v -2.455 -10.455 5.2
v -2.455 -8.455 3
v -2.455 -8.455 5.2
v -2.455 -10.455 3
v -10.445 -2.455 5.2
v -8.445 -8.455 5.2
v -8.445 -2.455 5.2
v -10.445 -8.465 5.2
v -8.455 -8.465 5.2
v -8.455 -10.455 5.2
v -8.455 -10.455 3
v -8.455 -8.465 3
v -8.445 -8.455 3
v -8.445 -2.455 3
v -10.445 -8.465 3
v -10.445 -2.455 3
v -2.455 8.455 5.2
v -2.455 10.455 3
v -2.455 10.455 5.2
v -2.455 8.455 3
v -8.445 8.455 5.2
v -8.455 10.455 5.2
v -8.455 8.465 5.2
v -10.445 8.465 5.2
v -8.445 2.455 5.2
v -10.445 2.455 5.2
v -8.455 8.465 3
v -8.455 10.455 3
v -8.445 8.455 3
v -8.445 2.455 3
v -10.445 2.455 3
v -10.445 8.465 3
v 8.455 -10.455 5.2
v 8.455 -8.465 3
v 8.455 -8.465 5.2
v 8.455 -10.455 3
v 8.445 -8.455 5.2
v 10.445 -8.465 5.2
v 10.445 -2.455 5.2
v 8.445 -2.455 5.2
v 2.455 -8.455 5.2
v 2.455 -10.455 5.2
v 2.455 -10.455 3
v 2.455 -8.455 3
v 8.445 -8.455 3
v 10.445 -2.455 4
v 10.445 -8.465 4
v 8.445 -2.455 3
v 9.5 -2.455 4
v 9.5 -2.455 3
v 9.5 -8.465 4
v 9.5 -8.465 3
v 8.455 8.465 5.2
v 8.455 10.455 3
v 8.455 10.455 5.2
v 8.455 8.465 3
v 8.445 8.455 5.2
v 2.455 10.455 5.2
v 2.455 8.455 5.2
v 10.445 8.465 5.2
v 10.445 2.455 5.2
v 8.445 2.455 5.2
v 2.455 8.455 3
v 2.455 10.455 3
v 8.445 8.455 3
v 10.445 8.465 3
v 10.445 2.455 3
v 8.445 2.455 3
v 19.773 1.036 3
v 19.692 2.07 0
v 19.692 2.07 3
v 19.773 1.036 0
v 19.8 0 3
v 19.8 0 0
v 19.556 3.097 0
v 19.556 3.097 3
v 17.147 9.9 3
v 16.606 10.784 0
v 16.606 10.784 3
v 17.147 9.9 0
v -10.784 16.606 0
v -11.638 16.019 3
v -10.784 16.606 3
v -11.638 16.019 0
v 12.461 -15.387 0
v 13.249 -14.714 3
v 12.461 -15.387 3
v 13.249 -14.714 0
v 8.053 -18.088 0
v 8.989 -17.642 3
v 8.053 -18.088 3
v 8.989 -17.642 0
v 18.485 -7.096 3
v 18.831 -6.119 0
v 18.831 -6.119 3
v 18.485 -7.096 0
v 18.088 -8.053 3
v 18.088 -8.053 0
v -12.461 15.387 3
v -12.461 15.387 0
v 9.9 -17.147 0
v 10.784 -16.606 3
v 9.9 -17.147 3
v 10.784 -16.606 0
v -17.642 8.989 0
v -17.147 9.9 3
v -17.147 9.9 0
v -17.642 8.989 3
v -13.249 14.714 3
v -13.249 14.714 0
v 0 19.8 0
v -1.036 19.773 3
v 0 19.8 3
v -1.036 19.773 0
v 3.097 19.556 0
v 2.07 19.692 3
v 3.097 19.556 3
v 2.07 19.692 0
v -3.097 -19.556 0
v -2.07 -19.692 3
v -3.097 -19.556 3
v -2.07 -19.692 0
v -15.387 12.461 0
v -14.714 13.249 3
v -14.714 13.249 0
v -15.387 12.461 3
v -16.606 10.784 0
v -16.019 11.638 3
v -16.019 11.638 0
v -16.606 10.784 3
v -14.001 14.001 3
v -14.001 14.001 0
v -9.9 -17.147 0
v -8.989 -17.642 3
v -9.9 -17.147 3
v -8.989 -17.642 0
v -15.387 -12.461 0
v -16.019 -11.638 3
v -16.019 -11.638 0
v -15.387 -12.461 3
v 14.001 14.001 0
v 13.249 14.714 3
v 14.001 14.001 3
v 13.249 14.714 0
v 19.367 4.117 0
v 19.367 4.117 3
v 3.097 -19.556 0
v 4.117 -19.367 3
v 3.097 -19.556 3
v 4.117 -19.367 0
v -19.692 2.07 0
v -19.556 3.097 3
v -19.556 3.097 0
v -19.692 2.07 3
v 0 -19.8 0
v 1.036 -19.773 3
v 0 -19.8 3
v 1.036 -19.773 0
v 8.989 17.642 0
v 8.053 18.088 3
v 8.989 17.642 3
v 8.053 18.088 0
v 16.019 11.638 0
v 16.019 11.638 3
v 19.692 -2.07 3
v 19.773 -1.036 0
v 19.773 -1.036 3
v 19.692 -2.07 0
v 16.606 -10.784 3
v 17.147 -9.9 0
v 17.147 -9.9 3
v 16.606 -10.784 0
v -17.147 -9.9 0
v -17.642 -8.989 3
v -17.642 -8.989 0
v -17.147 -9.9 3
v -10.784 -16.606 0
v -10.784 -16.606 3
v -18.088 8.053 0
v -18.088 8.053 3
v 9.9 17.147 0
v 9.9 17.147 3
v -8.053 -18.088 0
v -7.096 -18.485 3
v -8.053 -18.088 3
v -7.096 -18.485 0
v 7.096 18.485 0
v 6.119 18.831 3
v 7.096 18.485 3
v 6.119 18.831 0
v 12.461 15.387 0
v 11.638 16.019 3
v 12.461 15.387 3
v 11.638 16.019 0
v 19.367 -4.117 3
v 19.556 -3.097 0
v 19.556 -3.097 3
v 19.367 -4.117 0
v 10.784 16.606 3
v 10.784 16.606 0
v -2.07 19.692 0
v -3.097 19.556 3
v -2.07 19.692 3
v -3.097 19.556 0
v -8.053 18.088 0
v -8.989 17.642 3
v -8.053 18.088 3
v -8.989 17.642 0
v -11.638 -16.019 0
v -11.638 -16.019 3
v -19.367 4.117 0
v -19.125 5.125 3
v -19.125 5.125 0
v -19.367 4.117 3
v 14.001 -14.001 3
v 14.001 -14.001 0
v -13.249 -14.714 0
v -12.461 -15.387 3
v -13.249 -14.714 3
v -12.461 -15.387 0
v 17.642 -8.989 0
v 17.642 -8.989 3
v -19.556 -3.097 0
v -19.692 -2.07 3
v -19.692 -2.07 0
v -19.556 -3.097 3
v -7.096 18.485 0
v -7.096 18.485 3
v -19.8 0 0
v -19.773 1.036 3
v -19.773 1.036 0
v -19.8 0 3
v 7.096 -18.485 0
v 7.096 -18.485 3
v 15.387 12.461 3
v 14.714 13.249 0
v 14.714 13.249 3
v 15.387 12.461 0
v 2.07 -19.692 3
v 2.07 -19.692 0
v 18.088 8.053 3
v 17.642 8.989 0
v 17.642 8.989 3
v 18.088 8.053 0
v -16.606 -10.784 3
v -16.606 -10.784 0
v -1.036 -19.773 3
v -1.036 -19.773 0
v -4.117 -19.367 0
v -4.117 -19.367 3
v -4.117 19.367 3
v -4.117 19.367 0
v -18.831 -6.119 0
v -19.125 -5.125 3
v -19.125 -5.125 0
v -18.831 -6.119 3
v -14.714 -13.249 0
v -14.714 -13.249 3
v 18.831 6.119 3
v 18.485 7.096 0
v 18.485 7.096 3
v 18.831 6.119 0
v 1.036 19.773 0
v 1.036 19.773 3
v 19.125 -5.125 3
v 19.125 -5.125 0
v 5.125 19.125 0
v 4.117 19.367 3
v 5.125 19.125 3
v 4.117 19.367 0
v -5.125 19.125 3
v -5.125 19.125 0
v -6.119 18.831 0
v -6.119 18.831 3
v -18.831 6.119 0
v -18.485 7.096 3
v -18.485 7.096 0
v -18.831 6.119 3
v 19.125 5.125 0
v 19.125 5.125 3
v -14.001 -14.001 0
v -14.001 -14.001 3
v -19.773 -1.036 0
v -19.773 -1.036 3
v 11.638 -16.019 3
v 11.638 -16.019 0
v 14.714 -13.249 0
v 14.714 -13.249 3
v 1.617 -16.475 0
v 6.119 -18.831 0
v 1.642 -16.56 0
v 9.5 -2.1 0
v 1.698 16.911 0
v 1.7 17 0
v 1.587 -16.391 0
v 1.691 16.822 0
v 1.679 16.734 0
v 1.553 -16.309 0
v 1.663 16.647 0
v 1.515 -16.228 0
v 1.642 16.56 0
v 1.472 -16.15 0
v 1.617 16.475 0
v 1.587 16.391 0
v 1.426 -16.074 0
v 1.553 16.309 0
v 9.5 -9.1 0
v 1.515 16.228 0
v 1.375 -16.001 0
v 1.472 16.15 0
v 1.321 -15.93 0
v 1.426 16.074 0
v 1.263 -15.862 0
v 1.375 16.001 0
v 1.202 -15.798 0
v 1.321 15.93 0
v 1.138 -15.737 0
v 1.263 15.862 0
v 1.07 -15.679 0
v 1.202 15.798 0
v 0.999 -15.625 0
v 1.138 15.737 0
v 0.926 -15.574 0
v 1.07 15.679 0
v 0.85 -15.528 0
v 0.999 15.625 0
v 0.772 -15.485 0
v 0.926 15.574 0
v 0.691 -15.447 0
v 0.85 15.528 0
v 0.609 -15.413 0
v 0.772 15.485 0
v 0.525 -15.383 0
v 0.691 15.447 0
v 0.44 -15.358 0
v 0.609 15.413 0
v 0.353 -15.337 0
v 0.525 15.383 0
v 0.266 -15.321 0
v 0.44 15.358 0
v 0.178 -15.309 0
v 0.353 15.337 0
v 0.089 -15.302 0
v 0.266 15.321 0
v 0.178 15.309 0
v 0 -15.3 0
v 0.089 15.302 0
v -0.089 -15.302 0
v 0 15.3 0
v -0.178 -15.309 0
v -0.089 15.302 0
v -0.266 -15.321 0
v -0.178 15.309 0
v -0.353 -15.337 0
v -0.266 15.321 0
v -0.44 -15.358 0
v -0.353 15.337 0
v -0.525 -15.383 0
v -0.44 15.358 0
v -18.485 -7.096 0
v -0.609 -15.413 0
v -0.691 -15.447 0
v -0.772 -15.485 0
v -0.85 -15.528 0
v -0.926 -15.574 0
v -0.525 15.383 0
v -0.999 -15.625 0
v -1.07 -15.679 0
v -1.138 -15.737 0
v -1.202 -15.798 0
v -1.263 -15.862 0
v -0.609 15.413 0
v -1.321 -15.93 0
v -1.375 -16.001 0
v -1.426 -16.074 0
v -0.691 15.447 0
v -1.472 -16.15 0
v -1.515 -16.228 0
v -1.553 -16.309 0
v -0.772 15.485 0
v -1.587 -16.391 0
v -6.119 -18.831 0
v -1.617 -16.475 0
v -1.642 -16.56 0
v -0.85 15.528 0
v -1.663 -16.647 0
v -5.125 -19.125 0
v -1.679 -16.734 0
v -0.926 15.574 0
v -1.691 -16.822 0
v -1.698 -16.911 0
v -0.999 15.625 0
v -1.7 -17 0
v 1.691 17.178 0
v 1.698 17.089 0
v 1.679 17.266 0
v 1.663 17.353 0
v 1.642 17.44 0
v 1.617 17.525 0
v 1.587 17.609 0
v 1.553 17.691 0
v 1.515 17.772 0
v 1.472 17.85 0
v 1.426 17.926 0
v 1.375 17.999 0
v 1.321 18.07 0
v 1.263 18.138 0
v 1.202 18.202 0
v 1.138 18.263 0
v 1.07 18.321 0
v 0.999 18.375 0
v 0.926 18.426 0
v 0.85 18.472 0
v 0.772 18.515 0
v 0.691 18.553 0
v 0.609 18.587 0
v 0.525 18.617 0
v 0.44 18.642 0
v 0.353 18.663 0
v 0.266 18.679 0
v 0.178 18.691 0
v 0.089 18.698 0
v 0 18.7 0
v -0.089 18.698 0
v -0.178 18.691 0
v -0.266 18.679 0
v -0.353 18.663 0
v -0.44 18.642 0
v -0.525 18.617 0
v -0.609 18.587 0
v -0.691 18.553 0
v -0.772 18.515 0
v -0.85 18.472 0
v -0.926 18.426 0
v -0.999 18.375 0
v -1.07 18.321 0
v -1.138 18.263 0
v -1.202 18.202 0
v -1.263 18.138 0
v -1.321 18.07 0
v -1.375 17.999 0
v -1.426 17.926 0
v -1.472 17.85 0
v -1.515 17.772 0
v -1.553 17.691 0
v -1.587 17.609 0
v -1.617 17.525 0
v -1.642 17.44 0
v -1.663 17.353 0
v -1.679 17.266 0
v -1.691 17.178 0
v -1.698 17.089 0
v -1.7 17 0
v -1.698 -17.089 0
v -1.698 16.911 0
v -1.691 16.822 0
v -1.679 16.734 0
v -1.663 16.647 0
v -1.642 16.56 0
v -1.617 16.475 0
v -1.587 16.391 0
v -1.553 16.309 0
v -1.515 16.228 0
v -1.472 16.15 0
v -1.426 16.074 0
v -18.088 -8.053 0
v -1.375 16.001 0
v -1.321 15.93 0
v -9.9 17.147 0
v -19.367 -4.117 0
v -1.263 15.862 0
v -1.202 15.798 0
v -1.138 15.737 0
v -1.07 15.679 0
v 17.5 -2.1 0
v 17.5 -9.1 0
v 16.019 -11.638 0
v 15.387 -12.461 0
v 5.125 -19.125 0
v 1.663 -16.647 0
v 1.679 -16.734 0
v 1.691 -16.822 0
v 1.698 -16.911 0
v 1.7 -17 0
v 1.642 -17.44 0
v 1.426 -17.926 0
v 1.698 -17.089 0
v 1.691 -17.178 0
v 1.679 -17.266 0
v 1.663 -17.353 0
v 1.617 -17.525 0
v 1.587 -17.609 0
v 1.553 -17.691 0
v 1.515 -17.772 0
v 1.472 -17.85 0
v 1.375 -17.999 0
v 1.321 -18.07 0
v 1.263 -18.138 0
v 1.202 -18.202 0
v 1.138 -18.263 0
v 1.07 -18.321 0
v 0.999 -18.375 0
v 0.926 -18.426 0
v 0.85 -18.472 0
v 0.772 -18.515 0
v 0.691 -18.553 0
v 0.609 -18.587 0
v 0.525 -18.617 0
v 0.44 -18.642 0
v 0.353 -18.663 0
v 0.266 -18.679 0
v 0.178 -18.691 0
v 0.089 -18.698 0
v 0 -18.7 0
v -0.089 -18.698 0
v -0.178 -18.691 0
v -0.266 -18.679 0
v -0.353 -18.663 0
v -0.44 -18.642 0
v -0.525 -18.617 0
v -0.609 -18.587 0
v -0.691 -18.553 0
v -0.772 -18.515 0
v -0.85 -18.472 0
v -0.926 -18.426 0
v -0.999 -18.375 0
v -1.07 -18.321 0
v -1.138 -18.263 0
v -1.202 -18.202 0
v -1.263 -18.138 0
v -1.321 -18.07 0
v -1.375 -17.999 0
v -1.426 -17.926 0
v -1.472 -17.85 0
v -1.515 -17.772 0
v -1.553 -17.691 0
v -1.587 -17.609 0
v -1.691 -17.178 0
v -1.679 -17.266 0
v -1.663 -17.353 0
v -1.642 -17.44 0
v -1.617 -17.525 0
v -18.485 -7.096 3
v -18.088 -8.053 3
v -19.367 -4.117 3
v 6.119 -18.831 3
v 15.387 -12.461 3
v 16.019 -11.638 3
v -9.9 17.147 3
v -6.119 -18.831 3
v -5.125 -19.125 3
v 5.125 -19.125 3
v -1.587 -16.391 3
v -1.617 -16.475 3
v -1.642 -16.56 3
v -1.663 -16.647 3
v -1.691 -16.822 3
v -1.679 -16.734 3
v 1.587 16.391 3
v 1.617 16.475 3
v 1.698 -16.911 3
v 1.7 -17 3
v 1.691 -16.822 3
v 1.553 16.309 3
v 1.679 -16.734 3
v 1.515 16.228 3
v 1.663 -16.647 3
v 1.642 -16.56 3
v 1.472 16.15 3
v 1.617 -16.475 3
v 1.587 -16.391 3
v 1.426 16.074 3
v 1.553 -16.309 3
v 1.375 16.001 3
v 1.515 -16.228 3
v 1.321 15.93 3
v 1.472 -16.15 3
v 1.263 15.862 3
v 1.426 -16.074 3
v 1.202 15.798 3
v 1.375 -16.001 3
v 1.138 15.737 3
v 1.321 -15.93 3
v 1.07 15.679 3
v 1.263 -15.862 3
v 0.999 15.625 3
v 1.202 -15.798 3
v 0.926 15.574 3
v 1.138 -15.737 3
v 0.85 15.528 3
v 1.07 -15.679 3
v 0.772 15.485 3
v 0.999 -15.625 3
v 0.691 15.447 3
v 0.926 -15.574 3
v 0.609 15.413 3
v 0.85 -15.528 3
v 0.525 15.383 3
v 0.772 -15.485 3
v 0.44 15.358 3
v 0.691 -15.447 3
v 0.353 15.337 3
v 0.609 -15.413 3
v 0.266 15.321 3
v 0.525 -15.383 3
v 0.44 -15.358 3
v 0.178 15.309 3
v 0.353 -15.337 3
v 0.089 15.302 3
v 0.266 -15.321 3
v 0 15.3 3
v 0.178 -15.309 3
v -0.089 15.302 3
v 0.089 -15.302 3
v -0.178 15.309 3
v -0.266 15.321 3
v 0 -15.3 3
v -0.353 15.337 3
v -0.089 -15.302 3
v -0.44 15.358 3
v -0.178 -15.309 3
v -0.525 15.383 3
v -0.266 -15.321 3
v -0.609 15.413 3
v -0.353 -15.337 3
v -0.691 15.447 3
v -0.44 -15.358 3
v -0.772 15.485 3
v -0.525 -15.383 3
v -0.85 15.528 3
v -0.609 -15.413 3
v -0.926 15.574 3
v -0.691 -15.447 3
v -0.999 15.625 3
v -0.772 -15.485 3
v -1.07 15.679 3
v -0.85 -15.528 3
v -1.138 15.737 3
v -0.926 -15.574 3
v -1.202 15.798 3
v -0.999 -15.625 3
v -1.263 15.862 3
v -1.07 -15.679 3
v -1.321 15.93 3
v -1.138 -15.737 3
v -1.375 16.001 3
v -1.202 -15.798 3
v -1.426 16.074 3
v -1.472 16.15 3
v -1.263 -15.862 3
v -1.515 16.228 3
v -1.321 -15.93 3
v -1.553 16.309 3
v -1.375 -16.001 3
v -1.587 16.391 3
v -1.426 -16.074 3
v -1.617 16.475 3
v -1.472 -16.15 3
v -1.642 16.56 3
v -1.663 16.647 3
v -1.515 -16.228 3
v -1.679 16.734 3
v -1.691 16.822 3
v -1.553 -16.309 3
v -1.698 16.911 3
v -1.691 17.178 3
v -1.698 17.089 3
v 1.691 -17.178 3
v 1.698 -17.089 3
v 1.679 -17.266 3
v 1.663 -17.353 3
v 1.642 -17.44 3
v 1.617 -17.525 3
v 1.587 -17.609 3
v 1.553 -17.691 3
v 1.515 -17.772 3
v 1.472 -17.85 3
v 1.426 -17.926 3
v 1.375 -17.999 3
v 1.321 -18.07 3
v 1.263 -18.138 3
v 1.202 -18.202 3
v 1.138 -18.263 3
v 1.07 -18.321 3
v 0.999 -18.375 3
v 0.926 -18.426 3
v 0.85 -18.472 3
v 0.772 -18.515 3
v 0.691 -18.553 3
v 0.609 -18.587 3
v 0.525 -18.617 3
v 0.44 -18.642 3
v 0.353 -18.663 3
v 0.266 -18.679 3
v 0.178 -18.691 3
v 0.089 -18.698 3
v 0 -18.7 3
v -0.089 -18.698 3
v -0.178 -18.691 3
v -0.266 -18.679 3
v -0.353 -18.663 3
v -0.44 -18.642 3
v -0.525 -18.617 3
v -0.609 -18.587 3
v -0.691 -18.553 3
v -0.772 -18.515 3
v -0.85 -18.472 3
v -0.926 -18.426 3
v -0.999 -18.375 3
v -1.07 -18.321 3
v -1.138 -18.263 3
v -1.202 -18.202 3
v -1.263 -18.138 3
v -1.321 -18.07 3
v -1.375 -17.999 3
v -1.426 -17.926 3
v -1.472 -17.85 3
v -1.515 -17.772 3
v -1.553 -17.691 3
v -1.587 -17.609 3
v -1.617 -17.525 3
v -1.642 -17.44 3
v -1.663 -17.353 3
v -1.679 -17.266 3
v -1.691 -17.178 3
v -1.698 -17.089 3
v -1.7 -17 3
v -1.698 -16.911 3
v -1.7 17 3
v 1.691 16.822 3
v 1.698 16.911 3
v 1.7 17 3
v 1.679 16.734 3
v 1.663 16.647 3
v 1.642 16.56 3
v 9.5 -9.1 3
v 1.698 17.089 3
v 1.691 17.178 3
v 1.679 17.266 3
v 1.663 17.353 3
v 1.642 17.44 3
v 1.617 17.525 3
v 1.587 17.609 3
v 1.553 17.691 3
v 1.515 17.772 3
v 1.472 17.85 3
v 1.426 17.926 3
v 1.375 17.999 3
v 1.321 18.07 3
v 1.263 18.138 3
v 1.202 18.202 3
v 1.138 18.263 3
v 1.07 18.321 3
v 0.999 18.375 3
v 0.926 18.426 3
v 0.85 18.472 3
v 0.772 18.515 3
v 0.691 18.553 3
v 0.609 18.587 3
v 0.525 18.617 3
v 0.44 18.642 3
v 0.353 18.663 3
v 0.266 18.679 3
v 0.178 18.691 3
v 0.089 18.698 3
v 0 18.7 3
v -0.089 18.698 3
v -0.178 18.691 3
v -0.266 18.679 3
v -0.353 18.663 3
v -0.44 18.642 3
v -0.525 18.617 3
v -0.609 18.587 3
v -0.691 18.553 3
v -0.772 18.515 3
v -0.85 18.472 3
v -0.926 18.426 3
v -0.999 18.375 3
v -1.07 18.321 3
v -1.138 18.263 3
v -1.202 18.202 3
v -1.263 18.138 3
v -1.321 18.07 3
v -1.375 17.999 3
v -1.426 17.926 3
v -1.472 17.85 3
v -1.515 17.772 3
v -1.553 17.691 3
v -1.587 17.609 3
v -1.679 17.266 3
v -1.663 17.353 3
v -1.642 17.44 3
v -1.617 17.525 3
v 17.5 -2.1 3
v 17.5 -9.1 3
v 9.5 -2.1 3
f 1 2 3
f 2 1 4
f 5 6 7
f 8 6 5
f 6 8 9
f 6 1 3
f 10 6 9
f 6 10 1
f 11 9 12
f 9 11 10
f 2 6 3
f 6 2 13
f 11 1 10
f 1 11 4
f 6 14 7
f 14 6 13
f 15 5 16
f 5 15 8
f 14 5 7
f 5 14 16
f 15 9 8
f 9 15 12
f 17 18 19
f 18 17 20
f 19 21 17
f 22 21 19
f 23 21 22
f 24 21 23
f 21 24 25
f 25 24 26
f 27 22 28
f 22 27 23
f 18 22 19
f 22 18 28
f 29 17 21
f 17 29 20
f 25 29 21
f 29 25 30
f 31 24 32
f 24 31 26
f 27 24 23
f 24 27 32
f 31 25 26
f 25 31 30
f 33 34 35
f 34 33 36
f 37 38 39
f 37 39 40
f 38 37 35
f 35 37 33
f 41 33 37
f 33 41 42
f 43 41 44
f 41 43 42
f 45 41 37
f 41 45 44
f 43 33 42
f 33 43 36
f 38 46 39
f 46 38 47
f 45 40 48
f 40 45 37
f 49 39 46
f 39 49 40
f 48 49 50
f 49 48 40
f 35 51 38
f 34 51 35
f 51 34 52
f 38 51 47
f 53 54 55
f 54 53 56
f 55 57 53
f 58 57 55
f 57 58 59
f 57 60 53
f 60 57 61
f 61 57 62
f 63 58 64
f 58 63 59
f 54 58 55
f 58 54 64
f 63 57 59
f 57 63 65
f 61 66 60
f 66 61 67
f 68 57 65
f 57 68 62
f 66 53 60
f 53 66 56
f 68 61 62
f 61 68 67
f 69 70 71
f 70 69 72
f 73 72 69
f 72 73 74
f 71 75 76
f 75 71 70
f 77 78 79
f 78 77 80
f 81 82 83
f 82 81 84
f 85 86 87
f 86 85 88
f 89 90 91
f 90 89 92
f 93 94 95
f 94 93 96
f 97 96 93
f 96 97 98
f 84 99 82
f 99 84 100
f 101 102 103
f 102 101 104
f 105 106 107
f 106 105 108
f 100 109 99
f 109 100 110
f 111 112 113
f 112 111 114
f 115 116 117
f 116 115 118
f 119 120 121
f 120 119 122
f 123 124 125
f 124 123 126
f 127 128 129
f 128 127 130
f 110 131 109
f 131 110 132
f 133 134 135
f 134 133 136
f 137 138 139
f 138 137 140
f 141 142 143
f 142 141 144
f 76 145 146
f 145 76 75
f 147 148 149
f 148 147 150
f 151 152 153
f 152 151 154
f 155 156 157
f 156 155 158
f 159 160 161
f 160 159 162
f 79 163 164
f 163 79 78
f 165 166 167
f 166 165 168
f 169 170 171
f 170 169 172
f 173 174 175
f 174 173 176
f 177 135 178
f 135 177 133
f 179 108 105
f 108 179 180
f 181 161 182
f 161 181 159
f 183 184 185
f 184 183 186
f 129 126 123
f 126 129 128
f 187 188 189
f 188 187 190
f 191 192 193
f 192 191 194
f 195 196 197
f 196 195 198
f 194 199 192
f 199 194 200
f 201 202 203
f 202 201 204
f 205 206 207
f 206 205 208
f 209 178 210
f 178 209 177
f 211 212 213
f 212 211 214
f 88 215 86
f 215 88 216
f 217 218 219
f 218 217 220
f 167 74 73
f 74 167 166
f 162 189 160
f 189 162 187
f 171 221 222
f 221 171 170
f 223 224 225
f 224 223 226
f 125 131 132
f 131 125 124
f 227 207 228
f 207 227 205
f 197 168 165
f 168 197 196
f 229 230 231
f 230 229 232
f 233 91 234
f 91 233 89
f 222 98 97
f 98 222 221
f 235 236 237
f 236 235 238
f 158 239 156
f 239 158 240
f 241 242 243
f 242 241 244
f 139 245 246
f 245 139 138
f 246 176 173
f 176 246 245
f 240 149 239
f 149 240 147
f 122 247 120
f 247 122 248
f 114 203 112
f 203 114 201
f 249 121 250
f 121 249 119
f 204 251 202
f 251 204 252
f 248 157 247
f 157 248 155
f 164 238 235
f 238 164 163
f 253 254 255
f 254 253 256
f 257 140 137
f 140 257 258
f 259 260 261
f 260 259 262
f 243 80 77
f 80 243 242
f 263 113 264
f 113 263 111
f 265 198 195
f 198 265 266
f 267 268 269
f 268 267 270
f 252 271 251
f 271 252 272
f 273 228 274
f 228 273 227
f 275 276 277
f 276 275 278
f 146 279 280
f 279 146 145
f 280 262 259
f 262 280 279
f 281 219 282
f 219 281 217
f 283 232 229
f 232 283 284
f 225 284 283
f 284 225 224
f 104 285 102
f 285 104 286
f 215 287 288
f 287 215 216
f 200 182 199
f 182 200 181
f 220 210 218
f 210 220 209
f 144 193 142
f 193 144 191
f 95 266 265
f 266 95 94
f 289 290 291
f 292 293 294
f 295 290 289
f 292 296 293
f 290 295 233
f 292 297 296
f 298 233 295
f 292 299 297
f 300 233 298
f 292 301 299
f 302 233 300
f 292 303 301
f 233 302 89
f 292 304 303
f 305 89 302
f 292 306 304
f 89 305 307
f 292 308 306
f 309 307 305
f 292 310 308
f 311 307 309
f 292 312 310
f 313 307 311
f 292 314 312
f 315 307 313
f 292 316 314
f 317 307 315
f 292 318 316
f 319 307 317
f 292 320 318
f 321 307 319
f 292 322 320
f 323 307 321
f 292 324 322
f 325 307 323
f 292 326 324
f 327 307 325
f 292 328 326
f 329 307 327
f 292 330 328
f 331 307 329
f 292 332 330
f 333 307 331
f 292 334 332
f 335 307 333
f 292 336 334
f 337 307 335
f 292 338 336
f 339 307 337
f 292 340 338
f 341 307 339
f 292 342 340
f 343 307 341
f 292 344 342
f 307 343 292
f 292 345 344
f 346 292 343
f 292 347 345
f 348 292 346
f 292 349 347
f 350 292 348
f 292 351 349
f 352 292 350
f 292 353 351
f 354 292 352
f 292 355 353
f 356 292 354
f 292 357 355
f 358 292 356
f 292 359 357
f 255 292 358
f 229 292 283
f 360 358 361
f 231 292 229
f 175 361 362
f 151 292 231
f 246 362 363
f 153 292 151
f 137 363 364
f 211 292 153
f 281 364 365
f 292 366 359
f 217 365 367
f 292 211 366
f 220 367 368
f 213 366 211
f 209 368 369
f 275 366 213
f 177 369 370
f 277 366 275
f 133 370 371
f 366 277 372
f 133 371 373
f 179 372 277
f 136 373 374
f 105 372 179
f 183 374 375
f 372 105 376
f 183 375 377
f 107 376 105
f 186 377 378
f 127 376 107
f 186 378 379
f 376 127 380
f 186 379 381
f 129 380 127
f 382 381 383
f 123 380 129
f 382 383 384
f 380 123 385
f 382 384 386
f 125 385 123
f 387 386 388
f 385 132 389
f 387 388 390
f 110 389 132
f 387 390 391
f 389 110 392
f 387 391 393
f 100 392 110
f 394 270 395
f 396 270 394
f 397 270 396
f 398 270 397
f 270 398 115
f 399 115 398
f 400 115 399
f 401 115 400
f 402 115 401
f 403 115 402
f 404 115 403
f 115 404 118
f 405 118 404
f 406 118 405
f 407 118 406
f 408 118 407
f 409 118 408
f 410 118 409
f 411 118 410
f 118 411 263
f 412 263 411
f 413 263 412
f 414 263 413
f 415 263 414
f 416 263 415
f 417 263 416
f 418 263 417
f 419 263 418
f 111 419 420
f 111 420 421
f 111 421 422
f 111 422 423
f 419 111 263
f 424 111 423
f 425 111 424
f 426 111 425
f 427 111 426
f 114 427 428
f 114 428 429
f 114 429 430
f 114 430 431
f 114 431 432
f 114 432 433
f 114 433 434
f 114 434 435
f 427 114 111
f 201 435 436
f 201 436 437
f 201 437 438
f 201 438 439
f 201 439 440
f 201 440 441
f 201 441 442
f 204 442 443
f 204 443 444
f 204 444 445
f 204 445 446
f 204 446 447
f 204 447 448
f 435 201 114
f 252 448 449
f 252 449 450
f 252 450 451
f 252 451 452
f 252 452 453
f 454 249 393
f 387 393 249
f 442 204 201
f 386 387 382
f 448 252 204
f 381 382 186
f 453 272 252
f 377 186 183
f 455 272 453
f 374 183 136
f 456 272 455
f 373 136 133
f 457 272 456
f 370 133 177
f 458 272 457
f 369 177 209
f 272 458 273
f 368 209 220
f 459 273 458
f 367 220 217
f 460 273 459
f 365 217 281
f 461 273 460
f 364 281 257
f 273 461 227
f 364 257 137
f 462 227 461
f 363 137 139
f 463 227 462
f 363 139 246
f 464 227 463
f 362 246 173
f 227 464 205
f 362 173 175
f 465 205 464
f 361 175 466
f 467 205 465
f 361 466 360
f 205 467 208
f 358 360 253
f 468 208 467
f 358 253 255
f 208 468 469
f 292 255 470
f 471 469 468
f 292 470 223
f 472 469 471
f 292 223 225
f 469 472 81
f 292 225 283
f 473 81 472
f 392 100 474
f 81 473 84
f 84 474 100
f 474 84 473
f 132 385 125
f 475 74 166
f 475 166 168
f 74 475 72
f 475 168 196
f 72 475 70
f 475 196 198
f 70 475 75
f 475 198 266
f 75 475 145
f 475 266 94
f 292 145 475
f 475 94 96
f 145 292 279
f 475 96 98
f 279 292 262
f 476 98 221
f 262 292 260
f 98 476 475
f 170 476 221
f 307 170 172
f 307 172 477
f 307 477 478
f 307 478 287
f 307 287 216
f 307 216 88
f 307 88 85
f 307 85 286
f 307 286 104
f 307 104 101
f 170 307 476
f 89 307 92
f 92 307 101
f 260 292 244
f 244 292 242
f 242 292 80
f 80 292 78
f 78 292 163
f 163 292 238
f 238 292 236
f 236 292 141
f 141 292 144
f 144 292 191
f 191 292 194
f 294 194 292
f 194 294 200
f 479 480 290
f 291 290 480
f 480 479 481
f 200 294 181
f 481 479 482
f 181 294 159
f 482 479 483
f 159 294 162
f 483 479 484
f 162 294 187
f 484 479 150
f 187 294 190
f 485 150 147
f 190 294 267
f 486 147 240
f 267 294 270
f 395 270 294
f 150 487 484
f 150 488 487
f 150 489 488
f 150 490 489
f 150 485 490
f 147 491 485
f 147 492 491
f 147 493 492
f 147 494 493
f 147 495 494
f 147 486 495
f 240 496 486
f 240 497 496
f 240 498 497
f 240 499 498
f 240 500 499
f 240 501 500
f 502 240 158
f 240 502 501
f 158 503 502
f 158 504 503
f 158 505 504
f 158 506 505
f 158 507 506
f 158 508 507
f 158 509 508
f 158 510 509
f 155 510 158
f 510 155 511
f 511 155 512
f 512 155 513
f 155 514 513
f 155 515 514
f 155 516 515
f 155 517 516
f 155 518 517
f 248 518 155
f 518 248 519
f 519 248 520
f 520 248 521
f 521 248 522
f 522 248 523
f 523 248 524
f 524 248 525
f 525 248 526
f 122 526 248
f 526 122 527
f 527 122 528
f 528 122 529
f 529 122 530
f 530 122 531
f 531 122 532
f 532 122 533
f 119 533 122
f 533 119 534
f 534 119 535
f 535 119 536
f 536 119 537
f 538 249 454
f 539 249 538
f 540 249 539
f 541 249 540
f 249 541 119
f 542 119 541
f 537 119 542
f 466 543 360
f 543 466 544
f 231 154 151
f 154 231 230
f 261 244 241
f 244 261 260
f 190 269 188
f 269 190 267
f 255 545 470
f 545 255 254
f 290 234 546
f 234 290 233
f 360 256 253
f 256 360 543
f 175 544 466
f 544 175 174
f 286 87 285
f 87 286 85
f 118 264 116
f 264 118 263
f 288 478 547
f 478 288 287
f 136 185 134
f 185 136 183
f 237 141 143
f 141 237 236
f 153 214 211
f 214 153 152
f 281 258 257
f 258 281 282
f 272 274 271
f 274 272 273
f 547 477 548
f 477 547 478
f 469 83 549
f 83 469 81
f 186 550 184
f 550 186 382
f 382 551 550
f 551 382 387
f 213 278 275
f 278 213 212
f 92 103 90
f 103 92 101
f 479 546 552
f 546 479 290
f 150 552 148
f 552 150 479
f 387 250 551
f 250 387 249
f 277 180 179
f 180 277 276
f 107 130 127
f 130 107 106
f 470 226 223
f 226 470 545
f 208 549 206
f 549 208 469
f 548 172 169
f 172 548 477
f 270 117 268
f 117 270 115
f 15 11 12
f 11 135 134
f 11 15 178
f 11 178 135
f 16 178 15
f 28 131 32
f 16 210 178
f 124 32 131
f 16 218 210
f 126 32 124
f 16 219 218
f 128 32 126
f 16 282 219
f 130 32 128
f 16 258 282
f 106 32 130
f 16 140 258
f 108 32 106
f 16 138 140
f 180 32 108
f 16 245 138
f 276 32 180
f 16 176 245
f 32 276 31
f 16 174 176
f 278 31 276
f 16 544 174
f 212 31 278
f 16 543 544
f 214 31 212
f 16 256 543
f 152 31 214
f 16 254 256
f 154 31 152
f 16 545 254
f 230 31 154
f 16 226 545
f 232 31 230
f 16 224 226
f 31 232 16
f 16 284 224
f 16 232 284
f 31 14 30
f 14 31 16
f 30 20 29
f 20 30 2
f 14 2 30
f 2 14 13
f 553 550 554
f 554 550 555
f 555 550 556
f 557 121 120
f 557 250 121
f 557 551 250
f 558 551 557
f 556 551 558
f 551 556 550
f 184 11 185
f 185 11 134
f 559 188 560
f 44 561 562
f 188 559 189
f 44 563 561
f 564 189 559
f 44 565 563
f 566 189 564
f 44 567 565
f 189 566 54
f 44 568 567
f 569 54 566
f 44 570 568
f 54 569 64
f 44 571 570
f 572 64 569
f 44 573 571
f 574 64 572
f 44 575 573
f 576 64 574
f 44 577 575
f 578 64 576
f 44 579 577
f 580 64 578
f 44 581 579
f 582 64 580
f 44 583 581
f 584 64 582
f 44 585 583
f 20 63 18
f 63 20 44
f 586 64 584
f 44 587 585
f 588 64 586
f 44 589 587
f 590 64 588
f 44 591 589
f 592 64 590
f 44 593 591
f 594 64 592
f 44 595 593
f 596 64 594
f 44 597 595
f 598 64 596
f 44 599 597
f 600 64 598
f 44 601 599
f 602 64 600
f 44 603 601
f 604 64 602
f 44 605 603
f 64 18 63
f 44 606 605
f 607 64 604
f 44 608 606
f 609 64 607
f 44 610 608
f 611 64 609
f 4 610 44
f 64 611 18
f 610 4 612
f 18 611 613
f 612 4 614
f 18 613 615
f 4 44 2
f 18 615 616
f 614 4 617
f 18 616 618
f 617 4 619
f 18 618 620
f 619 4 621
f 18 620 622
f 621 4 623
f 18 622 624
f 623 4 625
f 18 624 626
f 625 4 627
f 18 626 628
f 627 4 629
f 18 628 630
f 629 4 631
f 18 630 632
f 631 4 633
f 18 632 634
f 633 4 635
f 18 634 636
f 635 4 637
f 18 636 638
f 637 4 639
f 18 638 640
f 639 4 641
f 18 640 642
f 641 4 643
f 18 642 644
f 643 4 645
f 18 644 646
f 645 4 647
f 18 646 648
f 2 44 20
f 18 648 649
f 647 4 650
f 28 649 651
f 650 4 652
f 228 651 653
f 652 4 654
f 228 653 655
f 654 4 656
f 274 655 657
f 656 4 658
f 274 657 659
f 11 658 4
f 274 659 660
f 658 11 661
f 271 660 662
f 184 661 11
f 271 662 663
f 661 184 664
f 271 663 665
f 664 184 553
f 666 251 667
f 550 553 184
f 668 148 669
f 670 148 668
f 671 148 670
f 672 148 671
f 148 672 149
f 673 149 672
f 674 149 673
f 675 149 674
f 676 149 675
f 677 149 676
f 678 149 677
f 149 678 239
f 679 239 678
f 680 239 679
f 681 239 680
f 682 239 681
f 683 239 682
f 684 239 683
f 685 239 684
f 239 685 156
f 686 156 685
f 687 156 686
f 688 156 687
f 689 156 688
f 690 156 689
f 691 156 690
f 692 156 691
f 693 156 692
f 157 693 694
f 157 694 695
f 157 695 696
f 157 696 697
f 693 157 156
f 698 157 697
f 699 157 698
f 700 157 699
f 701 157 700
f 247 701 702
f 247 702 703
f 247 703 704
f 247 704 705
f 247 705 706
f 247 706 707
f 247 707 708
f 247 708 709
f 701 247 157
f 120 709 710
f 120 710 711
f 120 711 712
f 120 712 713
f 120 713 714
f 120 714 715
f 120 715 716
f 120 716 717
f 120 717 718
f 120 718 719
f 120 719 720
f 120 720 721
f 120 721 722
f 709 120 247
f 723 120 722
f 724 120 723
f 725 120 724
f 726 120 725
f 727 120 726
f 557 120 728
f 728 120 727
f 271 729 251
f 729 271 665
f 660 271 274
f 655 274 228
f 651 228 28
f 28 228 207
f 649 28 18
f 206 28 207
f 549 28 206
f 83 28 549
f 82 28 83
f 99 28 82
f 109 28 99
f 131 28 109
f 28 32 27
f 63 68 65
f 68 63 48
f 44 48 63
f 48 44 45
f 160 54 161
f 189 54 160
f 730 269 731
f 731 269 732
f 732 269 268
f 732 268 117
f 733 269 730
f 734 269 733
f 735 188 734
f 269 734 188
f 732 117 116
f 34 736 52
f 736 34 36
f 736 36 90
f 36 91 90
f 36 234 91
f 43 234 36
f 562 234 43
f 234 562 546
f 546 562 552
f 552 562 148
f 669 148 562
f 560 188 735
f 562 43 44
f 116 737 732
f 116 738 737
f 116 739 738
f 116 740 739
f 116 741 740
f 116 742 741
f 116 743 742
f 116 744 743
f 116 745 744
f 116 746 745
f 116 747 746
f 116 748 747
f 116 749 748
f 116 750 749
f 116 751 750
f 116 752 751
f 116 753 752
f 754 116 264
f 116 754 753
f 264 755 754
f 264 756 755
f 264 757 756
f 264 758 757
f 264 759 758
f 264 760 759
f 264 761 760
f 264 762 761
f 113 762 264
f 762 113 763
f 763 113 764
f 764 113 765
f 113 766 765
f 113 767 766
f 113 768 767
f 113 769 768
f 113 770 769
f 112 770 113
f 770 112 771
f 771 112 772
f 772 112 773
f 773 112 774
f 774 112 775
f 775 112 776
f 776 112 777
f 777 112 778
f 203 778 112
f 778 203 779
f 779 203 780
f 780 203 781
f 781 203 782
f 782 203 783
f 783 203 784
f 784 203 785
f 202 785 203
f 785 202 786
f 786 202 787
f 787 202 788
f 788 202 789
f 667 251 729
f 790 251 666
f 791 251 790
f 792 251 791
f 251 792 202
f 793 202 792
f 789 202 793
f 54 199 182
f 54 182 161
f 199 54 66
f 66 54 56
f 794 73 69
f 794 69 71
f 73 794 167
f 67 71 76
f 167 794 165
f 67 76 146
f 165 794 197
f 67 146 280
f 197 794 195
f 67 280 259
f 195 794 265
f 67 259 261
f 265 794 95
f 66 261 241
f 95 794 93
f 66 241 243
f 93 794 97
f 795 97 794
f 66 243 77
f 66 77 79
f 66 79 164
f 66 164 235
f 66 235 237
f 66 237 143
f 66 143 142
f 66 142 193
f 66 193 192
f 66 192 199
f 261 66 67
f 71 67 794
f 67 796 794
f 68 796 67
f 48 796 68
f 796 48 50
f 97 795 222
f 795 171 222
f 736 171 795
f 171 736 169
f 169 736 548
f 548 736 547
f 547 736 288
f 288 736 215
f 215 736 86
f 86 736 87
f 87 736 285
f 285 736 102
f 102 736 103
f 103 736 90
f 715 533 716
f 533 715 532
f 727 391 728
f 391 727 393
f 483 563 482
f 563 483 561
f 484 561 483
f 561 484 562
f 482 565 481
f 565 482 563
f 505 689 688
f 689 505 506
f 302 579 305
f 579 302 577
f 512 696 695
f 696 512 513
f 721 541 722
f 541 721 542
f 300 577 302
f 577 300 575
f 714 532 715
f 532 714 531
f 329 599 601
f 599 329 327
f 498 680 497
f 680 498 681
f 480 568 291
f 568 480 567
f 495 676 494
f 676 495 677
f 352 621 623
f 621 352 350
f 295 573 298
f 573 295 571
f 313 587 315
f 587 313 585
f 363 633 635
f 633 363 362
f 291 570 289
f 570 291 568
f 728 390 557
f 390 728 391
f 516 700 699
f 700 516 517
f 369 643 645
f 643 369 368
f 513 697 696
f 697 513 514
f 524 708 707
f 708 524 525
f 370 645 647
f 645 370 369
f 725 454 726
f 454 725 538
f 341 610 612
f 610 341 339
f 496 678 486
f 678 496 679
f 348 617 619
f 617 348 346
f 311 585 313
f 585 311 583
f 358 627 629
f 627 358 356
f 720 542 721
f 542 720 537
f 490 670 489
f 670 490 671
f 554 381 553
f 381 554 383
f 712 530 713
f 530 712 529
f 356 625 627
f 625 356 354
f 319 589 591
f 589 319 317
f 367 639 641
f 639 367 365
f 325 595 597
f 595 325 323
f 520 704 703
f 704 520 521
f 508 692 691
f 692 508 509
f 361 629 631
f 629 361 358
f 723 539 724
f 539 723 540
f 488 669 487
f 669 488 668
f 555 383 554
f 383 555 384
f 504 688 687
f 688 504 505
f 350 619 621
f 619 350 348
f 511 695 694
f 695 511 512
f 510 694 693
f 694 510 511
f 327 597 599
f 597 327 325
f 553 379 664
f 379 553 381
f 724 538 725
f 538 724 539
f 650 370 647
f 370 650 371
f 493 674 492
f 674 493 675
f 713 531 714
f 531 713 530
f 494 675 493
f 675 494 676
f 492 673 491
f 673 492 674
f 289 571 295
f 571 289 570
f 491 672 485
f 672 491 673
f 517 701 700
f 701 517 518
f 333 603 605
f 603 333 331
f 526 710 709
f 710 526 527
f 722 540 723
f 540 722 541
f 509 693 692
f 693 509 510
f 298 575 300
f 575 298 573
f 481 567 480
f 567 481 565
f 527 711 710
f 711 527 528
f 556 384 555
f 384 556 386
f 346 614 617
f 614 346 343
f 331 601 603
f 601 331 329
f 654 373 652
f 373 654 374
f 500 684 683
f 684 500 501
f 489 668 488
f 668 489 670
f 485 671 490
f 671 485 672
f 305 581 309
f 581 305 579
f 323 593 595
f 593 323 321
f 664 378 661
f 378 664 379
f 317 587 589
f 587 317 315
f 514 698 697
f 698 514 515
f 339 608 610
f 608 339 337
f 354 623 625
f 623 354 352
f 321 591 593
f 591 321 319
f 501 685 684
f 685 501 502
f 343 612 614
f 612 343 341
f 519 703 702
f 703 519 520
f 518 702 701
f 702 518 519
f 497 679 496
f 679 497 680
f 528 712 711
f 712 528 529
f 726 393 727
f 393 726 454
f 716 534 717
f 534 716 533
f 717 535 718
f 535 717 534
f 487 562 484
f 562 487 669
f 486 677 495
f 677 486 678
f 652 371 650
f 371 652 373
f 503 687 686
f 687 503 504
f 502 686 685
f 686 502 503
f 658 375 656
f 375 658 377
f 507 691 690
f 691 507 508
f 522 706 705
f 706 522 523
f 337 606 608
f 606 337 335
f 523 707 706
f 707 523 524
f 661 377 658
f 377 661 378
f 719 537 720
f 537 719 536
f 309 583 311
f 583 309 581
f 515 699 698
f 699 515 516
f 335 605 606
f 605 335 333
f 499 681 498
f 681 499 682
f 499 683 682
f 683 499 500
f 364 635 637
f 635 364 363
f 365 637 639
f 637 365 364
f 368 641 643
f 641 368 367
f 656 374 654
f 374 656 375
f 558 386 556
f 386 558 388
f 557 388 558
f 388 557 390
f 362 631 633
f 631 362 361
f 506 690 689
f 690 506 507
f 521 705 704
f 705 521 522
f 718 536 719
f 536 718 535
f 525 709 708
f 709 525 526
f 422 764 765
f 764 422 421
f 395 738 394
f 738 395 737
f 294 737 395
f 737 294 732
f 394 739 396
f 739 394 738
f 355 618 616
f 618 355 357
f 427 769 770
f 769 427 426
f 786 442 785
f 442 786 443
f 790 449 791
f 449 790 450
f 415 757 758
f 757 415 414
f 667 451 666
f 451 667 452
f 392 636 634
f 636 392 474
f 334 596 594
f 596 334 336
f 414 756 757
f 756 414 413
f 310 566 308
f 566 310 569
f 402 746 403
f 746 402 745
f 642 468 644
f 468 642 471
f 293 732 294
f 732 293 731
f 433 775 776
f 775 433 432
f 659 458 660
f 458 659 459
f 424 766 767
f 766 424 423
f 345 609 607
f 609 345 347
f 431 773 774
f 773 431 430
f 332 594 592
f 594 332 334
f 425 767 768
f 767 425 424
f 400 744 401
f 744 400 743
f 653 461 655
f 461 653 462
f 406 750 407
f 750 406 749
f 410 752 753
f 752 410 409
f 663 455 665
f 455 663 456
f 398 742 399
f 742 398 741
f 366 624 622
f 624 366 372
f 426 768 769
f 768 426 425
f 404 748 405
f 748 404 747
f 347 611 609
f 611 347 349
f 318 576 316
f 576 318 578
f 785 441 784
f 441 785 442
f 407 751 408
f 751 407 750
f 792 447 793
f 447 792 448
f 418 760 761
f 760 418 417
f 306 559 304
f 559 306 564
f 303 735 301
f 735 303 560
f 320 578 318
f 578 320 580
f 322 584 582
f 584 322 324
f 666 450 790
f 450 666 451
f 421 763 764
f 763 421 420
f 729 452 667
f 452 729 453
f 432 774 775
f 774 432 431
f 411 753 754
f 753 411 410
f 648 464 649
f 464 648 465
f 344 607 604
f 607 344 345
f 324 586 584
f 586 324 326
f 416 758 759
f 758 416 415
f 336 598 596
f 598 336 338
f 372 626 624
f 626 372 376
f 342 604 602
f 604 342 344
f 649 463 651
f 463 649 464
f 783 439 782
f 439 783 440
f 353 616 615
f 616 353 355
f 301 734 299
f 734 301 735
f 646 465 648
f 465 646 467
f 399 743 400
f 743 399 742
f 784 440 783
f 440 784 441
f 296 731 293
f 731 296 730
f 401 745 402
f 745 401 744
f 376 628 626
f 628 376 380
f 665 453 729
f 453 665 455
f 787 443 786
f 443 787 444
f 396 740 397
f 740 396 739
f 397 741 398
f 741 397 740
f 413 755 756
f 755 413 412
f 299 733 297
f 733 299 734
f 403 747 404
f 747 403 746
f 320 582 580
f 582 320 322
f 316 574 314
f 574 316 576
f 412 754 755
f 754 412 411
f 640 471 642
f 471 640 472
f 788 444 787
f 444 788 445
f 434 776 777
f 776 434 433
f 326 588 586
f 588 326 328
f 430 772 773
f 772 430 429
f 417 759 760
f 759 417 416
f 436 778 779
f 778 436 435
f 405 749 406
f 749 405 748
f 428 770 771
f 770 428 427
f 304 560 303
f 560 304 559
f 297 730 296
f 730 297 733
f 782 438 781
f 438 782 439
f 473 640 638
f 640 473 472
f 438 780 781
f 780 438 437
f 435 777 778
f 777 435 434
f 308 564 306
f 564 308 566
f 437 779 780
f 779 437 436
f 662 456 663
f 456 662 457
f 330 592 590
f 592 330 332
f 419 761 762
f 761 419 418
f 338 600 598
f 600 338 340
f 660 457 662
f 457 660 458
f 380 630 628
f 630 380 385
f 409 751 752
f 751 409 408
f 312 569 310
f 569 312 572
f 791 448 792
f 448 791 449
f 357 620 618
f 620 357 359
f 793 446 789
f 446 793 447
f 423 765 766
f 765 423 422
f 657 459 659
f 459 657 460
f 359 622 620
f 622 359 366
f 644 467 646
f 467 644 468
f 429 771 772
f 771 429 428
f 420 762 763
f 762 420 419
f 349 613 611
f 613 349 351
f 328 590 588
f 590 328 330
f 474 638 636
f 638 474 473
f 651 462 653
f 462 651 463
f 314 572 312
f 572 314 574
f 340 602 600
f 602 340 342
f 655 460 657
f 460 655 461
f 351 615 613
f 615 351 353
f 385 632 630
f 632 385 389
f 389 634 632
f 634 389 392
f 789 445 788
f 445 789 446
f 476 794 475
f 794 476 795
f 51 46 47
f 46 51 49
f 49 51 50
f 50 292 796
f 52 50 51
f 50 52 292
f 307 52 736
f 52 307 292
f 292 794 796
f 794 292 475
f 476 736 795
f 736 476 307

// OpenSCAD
// deck print. Prints as shown.
include <model.scad>
view = "deck_print";
exit = "center";
